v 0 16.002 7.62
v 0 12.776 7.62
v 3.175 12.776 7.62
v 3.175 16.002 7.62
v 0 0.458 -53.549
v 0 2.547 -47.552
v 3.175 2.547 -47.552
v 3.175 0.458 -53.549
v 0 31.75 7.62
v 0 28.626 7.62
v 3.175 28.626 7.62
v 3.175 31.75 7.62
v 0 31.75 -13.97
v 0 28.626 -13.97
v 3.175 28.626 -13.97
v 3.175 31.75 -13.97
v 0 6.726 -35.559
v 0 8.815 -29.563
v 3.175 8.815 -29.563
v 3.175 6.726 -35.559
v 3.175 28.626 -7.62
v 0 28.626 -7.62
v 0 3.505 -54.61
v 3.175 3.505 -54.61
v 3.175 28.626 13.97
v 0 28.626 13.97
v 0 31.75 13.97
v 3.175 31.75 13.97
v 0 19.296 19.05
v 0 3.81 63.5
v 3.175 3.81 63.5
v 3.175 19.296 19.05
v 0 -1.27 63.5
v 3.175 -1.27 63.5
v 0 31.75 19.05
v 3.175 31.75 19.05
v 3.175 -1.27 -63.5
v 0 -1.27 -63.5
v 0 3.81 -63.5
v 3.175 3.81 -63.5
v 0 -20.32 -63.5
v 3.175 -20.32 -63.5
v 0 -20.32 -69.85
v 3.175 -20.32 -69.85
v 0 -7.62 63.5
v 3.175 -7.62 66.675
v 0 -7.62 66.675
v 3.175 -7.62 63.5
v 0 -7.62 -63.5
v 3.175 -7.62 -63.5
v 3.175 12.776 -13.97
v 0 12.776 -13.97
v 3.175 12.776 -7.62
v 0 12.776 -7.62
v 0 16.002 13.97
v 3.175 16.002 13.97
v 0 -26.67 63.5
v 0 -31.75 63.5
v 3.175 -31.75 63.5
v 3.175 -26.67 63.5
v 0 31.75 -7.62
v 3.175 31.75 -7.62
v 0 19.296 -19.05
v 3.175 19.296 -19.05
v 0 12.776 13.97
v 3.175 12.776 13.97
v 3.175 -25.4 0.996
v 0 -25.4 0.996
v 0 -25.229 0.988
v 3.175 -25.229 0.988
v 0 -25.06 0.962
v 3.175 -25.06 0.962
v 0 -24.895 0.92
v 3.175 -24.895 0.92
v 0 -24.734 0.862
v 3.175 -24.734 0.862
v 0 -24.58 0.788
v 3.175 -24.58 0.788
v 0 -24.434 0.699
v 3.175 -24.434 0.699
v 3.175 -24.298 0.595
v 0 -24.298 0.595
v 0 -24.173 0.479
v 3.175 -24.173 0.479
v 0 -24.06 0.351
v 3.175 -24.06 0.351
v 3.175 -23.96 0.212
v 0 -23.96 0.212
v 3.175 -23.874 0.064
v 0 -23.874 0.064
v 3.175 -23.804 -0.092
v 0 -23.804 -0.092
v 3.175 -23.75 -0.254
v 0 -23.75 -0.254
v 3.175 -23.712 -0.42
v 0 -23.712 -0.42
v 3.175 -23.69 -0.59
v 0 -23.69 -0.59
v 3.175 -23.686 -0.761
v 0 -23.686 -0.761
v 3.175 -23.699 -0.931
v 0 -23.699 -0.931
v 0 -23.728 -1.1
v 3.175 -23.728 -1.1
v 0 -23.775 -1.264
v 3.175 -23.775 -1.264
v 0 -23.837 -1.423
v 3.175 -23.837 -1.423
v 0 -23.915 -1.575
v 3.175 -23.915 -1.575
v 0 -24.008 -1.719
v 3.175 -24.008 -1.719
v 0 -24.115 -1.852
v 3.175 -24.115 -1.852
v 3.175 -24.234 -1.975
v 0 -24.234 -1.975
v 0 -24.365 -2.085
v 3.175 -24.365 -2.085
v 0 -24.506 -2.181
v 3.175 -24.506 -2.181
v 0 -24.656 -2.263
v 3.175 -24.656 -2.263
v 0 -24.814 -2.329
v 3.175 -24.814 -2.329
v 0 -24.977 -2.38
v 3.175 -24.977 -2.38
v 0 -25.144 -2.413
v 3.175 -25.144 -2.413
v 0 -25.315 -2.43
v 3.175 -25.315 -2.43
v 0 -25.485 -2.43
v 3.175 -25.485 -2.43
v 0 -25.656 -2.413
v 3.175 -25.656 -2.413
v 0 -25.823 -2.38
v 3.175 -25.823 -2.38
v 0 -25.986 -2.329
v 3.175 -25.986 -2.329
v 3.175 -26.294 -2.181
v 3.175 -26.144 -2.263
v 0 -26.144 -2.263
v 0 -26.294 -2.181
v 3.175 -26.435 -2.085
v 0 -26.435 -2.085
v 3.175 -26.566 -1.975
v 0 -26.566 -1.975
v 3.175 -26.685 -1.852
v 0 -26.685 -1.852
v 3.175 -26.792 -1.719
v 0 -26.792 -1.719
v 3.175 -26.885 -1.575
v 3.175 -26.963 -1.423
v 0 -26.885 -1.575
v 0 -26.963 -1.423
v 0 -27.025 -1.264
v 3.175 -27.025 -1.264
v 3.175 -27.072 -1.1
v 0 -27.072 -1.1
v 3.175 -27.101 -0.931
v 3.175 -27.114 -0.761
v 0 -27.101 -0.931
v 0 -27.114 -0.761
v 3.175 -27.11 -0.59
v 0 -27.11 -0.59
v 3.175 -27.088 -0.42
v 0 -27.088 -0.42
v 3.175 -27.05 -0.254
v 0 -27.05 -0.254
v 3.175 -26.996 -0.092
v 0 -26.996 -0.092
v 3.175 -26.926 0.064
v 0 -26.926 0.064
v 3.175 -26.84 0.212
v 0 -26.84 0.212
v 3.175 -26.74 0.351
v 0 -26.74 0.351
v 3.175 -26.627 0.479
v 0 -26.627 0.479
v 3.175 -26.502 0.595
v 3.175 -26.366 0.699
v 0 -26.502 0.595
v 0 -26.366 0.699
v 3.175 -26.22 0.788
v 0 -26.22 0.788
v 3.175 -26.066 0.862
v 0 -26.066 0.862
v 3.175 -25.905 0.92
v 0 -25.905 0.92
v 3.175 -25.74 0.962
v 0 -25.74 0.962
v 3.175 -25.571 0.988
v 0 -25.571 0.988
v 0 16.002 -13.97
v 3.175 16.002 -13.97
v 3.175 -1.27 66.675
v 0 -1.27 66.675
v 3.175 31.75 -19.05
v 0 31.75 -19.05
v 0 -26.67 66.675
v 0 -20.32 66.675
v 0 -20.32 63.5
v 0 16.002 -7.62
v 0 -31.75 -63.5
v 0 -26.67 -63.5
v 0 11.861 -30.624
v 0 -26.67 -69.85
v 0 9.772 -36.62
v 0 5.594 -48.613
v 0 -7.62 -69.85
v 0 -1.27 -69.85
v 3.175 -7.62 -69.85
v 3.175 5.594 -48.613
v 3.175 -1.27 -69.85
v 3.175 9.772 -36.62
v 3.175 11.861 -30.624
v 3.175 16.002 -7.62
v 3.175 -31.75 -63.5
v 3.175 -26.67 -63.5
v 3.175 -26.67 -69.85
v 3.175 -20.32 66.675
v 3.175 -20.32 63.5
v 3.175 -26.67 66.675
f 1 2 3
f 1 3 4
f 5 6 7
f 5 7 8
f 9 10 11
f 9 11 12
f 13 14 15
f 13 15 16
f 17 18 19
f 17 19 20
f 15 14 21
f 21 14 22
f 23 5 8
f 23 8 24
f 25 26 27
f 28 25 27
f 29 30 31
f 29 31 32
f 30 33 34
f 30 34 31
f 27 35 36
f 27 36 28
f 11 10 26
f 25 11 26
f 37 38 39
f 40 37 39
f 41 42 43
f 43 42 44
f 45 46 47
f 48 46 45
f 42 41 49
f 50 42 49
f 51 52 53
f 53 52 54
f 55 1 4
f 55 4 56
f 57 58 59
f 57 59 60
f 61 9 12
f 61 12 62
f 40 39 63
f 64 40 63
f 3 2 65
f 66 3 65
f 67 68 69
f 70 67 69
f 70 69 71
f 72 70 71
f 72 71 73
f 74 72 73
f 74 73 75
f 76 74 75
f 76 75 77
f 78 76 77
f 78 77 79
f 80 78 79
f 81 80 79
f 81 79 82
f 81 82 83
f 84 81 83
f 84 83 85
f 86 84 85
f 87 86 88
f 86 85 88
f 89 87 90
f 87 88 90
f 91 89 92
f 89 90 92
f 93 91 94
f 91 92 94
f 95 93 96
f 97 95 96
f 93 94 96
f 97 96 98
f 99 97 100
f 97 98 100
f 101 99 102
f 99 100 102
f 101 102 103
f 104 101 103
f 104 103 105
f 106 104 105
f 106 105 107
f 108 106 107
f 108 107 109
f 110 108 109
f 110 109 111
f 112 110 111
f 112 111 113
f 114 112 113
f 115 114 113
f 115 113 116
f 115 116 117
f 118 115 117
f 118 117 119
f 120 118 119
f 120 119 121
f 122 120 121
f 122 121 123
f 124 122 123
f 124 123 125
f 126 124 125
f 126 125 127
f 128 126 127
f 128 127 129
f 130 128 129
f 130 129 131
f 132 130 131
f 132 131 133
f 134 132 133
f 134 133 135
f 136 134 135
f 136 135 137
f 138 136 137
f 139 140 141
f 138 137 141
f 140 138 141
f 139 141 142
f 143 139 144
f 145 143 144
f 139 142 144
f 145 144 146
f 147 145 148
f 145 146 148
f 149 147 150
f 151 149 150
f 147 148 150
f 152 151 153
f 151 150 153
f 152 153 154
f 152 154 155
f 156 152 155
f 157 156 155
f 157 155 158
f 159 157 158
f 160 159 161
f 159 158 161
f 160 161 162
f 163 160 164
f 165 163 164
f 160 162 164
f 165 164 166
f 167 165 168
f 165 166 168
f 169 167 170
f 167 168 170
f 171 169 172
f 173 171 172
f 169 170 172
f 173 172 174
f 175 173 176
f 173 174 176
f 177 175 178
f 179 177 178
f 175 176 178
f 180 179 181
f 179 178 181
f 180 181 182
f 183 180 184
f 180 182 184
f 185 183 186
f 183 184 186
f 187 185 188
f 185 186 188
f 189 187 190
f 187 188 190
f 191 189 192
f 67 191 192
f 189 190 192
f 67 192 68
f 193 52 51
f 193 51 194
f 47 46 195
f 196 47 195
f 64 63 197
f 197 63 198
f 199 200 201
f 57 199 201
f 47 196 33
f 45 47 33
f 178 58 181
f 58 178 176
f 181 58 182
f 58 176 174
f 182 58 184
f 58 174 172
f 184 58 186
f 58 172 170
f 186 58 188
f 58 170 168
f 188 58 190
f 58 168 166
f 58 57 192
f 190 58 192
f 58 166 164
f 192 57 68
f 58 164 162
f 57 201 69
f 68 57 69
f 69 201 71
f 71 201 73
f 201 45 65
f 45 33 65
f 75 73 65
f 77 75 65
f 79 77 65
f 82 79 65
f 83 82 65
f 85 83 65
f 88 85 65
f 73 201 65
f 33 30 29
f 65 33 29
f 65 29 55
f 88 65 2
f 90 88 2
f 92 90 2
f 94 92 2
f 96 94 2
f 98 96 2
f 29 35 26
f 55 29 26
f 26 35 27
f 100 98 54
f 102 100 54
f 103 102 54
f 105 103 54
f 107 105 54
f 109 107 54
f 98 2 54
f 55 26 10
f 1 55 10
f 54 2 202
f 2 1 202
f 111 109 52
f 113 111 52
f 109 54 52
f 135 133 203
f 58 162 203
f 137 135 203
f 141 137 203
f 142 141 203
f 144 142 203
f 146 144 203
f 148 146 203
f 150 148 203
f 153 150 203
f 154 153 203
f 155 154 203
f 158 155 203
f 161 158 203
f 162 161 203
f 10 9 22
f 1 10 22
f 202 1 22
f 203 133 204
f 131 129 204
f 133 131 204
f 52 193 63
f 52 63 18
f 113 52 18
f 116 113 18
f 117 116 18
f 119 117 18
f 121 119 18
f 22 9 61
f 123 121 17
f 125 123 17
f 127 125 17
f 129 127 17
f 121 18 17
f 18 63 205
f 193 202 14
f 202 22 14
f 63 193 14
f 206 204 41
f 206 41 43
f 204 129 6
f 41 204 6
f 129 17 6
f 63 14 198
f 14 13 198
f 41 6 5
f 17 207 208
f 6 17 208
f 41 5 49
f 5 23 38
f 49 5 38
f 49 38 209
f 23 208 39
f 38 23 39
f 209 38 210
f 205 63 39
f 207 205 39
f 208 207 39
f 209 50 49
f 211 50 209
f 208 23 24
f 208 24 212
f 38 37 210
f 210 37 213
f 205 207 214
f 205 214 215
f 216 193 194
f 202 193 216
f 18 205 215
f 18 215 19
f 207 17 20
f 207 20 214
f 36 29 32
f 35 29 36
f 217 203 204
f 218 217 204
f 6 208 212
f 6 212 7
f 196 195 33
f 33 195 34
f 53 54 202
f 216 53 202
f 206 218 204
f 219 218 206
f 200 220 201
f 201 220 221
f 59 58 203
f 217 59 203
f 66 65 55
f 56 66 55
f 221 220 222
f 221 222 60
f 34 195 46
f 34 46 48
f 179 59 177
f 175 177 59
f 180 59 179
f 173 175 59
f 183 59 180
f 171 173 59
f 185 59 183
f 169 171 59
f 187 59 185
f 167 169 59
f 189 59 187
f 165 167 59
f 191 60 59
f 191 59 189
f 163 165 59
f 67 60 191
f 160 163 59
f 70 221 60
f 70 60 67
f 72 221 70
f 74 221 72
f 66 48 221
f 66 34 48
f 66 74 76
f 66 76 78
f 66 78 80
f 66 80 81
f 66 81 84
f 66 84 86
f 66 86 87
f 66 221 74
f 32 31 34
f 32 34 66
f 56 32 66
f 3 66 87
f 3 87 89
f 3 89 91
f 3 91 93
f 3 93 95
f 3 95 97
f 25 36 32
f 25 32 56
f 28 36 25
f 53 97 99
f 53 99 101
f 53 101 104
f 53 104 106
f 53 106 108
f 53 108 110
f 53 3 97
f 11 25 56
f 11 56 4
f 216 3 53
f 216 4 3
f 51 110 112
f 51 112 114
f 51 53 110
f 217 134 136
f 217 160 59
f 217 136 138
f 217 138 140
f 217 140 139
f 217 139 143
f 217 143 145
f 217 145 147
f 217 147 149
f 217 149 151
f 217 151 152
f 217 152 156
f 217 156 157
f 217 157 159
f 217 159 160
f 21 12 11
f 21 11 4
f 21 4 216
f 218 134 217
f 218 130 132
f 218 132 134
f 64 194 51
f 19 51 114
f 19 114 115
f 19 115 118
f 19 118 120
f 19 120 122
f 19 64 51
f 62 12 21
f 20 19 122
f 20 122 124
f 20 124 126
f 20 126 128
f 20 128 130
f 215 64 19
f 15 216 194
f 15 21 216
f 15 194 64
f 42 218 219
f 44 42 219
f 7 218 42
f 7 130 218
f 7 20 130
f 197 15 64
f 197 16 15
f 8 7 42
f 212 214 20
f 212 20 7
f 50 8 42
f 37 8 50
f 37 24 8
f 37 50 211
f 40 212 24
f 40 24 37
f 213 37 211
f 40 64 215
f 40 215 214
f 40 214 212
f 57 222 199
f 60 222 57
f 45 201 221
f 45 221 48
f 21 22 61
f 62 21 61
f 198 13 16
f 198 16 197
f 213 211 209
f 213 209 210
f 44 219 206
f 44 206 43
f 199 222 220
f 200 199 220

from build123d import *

# Parameters (mm, degrees)
SKETCH1_W                      = 38.1
SKETCH1_H                      = 63.5
BOSS_EXTRUDE1_DEPTH            = 3.175
SKETCH2_W                      = 6.35
SKETCH2_H                      = 3.1242
CUT_EXTRUDE1_DEPTH             = 4.175
SKETCH3_W                      = 6.35
SKETCH3_H                      = 3.2258
CUT_FOR_TABS_SERVO_PLATE_DEPTH = 4.175
BASE_EXTENSION_DEPTH           = 3.175
SKETCH5_W                      = 6.35
SKETCH5_H                      = 6.35
SKETCH5_W_2                    = 3.175
TABS_DEPTH                     = 3.175
CUT_FOR_NECK_COVER_TABS_DEPTH  = 4.175
SKETCH7_R                      = 1.7145
CUT_EXTRUDE2_DEPTH             = 4.175


with BuildPart() as part:
    # Sketch1 → Boss-Extrude1 (new body)
    with BuildSketch(Plane(origin=(0, 0, 0), x_dir=(0, 0, -1), z_dir=(1, 0, 0))):
        Rectangle(SKETCH1_W, SKETCH1_H)
    extrude(amount=BOSS_EXTRUDE1_DEPTH)

    # Sketch2 → Cut-Extrude1 (cut, through all)
    with BuildSketch(Plane.ZY):
        with Locations((-10.795, 30.1879)):
            Rectangle(SKETCH2_W, SKETCH2_H)
        with Locations((10.795, 30.1879)):
            Rectangle(SKETCH2_W, SKETCH2_H)
    extrude(amount=-CUT_EXTRUDE1_DEPTH, mode=Mode.SUBTRACT)

    # Sketch3 → cut for tabs servo plate (cut, through all)
    with BuildSketch(Plane.ZY):
        with Locations((-10.795, 14.3891)):
            Rectangle(SKETCH3_W, SKETCH3_H)
        with Locations((10.795, 14.3891)):
            Rectangle(SKETCH3_W, SKETCH3_H)
    extrude(amount=-CUT_FOR_TABS_SERVO_PLATE_DEPTH, mode=Mode.SUBTRACT)

    # Sketch4 → base extension (add)
    with BuildSketch(Plane.ZY):
        Polygon((19.05, -31.75), (63.5, -31.75), (63.5, 3.81), (19.05, 19.295607145), align=None)
    base_extension = extrude(amount=-BASE_EXTENSION_DEPTH)

    # Mirror1: base extension across plane
    add(base_extension.mirror(Plane.XY))

    # Sketch5 → tabs (add)
    with BuildSketch(Plane(origin=(3.175, 0, 0), x_dir=(0, 0, -1), z_dir=(1, 0, 0))):
        with Locations((66.675, -4.445)):
            Rectangle(SKETCH5_W, SKETCH5_H)
        with Locations((66.675, -23.495)):
            Rectangle(SKETCH5_W, SKETCH5_H)
        with Locations((-65.0875, -4.445)):
            Rectangle(SKETCH5_W_2, SKETCH5_H)
        with Locations((-65.0875, -23.495)):
            Rectangle(SKETCH5_W_2, SKETCH5_H)
    extrude(amount=-TABS_DEPTH)

    # Sketch6 → cut for neck cover tabs (cut, through all)
    with BuildSketch(Plane.ZY):
        Polygon((-36.620444722, 9.771864523), (-30.623926297, 11.860947281), (-29.562672256, 8.814715921), (-35.559190682, 6.725633163), align=None)
        Polygon((-48.613481574, 5.593699008), (-47.552227533, 2.547467647), (-53.548745959, 0.45838489), (-54.61, 3.50461625), align=None)
    extrude(amount=-CUT_FOR_NECK_COVER_TABS_DEPTH, mode=Mode.SUBTRACT)

    # Sketch7 → Cut-Extrude2 (cut, through all)
    with BuildSketch(Plane.ZY):
        with Locations((-0.718022777, -25.4)):
            Circle(SKETCH7_R)
    extrude(amount=-CUT_EXTRUDE2_DEPTH, mode=Mode.SUBTRACT)


solid = part.part
